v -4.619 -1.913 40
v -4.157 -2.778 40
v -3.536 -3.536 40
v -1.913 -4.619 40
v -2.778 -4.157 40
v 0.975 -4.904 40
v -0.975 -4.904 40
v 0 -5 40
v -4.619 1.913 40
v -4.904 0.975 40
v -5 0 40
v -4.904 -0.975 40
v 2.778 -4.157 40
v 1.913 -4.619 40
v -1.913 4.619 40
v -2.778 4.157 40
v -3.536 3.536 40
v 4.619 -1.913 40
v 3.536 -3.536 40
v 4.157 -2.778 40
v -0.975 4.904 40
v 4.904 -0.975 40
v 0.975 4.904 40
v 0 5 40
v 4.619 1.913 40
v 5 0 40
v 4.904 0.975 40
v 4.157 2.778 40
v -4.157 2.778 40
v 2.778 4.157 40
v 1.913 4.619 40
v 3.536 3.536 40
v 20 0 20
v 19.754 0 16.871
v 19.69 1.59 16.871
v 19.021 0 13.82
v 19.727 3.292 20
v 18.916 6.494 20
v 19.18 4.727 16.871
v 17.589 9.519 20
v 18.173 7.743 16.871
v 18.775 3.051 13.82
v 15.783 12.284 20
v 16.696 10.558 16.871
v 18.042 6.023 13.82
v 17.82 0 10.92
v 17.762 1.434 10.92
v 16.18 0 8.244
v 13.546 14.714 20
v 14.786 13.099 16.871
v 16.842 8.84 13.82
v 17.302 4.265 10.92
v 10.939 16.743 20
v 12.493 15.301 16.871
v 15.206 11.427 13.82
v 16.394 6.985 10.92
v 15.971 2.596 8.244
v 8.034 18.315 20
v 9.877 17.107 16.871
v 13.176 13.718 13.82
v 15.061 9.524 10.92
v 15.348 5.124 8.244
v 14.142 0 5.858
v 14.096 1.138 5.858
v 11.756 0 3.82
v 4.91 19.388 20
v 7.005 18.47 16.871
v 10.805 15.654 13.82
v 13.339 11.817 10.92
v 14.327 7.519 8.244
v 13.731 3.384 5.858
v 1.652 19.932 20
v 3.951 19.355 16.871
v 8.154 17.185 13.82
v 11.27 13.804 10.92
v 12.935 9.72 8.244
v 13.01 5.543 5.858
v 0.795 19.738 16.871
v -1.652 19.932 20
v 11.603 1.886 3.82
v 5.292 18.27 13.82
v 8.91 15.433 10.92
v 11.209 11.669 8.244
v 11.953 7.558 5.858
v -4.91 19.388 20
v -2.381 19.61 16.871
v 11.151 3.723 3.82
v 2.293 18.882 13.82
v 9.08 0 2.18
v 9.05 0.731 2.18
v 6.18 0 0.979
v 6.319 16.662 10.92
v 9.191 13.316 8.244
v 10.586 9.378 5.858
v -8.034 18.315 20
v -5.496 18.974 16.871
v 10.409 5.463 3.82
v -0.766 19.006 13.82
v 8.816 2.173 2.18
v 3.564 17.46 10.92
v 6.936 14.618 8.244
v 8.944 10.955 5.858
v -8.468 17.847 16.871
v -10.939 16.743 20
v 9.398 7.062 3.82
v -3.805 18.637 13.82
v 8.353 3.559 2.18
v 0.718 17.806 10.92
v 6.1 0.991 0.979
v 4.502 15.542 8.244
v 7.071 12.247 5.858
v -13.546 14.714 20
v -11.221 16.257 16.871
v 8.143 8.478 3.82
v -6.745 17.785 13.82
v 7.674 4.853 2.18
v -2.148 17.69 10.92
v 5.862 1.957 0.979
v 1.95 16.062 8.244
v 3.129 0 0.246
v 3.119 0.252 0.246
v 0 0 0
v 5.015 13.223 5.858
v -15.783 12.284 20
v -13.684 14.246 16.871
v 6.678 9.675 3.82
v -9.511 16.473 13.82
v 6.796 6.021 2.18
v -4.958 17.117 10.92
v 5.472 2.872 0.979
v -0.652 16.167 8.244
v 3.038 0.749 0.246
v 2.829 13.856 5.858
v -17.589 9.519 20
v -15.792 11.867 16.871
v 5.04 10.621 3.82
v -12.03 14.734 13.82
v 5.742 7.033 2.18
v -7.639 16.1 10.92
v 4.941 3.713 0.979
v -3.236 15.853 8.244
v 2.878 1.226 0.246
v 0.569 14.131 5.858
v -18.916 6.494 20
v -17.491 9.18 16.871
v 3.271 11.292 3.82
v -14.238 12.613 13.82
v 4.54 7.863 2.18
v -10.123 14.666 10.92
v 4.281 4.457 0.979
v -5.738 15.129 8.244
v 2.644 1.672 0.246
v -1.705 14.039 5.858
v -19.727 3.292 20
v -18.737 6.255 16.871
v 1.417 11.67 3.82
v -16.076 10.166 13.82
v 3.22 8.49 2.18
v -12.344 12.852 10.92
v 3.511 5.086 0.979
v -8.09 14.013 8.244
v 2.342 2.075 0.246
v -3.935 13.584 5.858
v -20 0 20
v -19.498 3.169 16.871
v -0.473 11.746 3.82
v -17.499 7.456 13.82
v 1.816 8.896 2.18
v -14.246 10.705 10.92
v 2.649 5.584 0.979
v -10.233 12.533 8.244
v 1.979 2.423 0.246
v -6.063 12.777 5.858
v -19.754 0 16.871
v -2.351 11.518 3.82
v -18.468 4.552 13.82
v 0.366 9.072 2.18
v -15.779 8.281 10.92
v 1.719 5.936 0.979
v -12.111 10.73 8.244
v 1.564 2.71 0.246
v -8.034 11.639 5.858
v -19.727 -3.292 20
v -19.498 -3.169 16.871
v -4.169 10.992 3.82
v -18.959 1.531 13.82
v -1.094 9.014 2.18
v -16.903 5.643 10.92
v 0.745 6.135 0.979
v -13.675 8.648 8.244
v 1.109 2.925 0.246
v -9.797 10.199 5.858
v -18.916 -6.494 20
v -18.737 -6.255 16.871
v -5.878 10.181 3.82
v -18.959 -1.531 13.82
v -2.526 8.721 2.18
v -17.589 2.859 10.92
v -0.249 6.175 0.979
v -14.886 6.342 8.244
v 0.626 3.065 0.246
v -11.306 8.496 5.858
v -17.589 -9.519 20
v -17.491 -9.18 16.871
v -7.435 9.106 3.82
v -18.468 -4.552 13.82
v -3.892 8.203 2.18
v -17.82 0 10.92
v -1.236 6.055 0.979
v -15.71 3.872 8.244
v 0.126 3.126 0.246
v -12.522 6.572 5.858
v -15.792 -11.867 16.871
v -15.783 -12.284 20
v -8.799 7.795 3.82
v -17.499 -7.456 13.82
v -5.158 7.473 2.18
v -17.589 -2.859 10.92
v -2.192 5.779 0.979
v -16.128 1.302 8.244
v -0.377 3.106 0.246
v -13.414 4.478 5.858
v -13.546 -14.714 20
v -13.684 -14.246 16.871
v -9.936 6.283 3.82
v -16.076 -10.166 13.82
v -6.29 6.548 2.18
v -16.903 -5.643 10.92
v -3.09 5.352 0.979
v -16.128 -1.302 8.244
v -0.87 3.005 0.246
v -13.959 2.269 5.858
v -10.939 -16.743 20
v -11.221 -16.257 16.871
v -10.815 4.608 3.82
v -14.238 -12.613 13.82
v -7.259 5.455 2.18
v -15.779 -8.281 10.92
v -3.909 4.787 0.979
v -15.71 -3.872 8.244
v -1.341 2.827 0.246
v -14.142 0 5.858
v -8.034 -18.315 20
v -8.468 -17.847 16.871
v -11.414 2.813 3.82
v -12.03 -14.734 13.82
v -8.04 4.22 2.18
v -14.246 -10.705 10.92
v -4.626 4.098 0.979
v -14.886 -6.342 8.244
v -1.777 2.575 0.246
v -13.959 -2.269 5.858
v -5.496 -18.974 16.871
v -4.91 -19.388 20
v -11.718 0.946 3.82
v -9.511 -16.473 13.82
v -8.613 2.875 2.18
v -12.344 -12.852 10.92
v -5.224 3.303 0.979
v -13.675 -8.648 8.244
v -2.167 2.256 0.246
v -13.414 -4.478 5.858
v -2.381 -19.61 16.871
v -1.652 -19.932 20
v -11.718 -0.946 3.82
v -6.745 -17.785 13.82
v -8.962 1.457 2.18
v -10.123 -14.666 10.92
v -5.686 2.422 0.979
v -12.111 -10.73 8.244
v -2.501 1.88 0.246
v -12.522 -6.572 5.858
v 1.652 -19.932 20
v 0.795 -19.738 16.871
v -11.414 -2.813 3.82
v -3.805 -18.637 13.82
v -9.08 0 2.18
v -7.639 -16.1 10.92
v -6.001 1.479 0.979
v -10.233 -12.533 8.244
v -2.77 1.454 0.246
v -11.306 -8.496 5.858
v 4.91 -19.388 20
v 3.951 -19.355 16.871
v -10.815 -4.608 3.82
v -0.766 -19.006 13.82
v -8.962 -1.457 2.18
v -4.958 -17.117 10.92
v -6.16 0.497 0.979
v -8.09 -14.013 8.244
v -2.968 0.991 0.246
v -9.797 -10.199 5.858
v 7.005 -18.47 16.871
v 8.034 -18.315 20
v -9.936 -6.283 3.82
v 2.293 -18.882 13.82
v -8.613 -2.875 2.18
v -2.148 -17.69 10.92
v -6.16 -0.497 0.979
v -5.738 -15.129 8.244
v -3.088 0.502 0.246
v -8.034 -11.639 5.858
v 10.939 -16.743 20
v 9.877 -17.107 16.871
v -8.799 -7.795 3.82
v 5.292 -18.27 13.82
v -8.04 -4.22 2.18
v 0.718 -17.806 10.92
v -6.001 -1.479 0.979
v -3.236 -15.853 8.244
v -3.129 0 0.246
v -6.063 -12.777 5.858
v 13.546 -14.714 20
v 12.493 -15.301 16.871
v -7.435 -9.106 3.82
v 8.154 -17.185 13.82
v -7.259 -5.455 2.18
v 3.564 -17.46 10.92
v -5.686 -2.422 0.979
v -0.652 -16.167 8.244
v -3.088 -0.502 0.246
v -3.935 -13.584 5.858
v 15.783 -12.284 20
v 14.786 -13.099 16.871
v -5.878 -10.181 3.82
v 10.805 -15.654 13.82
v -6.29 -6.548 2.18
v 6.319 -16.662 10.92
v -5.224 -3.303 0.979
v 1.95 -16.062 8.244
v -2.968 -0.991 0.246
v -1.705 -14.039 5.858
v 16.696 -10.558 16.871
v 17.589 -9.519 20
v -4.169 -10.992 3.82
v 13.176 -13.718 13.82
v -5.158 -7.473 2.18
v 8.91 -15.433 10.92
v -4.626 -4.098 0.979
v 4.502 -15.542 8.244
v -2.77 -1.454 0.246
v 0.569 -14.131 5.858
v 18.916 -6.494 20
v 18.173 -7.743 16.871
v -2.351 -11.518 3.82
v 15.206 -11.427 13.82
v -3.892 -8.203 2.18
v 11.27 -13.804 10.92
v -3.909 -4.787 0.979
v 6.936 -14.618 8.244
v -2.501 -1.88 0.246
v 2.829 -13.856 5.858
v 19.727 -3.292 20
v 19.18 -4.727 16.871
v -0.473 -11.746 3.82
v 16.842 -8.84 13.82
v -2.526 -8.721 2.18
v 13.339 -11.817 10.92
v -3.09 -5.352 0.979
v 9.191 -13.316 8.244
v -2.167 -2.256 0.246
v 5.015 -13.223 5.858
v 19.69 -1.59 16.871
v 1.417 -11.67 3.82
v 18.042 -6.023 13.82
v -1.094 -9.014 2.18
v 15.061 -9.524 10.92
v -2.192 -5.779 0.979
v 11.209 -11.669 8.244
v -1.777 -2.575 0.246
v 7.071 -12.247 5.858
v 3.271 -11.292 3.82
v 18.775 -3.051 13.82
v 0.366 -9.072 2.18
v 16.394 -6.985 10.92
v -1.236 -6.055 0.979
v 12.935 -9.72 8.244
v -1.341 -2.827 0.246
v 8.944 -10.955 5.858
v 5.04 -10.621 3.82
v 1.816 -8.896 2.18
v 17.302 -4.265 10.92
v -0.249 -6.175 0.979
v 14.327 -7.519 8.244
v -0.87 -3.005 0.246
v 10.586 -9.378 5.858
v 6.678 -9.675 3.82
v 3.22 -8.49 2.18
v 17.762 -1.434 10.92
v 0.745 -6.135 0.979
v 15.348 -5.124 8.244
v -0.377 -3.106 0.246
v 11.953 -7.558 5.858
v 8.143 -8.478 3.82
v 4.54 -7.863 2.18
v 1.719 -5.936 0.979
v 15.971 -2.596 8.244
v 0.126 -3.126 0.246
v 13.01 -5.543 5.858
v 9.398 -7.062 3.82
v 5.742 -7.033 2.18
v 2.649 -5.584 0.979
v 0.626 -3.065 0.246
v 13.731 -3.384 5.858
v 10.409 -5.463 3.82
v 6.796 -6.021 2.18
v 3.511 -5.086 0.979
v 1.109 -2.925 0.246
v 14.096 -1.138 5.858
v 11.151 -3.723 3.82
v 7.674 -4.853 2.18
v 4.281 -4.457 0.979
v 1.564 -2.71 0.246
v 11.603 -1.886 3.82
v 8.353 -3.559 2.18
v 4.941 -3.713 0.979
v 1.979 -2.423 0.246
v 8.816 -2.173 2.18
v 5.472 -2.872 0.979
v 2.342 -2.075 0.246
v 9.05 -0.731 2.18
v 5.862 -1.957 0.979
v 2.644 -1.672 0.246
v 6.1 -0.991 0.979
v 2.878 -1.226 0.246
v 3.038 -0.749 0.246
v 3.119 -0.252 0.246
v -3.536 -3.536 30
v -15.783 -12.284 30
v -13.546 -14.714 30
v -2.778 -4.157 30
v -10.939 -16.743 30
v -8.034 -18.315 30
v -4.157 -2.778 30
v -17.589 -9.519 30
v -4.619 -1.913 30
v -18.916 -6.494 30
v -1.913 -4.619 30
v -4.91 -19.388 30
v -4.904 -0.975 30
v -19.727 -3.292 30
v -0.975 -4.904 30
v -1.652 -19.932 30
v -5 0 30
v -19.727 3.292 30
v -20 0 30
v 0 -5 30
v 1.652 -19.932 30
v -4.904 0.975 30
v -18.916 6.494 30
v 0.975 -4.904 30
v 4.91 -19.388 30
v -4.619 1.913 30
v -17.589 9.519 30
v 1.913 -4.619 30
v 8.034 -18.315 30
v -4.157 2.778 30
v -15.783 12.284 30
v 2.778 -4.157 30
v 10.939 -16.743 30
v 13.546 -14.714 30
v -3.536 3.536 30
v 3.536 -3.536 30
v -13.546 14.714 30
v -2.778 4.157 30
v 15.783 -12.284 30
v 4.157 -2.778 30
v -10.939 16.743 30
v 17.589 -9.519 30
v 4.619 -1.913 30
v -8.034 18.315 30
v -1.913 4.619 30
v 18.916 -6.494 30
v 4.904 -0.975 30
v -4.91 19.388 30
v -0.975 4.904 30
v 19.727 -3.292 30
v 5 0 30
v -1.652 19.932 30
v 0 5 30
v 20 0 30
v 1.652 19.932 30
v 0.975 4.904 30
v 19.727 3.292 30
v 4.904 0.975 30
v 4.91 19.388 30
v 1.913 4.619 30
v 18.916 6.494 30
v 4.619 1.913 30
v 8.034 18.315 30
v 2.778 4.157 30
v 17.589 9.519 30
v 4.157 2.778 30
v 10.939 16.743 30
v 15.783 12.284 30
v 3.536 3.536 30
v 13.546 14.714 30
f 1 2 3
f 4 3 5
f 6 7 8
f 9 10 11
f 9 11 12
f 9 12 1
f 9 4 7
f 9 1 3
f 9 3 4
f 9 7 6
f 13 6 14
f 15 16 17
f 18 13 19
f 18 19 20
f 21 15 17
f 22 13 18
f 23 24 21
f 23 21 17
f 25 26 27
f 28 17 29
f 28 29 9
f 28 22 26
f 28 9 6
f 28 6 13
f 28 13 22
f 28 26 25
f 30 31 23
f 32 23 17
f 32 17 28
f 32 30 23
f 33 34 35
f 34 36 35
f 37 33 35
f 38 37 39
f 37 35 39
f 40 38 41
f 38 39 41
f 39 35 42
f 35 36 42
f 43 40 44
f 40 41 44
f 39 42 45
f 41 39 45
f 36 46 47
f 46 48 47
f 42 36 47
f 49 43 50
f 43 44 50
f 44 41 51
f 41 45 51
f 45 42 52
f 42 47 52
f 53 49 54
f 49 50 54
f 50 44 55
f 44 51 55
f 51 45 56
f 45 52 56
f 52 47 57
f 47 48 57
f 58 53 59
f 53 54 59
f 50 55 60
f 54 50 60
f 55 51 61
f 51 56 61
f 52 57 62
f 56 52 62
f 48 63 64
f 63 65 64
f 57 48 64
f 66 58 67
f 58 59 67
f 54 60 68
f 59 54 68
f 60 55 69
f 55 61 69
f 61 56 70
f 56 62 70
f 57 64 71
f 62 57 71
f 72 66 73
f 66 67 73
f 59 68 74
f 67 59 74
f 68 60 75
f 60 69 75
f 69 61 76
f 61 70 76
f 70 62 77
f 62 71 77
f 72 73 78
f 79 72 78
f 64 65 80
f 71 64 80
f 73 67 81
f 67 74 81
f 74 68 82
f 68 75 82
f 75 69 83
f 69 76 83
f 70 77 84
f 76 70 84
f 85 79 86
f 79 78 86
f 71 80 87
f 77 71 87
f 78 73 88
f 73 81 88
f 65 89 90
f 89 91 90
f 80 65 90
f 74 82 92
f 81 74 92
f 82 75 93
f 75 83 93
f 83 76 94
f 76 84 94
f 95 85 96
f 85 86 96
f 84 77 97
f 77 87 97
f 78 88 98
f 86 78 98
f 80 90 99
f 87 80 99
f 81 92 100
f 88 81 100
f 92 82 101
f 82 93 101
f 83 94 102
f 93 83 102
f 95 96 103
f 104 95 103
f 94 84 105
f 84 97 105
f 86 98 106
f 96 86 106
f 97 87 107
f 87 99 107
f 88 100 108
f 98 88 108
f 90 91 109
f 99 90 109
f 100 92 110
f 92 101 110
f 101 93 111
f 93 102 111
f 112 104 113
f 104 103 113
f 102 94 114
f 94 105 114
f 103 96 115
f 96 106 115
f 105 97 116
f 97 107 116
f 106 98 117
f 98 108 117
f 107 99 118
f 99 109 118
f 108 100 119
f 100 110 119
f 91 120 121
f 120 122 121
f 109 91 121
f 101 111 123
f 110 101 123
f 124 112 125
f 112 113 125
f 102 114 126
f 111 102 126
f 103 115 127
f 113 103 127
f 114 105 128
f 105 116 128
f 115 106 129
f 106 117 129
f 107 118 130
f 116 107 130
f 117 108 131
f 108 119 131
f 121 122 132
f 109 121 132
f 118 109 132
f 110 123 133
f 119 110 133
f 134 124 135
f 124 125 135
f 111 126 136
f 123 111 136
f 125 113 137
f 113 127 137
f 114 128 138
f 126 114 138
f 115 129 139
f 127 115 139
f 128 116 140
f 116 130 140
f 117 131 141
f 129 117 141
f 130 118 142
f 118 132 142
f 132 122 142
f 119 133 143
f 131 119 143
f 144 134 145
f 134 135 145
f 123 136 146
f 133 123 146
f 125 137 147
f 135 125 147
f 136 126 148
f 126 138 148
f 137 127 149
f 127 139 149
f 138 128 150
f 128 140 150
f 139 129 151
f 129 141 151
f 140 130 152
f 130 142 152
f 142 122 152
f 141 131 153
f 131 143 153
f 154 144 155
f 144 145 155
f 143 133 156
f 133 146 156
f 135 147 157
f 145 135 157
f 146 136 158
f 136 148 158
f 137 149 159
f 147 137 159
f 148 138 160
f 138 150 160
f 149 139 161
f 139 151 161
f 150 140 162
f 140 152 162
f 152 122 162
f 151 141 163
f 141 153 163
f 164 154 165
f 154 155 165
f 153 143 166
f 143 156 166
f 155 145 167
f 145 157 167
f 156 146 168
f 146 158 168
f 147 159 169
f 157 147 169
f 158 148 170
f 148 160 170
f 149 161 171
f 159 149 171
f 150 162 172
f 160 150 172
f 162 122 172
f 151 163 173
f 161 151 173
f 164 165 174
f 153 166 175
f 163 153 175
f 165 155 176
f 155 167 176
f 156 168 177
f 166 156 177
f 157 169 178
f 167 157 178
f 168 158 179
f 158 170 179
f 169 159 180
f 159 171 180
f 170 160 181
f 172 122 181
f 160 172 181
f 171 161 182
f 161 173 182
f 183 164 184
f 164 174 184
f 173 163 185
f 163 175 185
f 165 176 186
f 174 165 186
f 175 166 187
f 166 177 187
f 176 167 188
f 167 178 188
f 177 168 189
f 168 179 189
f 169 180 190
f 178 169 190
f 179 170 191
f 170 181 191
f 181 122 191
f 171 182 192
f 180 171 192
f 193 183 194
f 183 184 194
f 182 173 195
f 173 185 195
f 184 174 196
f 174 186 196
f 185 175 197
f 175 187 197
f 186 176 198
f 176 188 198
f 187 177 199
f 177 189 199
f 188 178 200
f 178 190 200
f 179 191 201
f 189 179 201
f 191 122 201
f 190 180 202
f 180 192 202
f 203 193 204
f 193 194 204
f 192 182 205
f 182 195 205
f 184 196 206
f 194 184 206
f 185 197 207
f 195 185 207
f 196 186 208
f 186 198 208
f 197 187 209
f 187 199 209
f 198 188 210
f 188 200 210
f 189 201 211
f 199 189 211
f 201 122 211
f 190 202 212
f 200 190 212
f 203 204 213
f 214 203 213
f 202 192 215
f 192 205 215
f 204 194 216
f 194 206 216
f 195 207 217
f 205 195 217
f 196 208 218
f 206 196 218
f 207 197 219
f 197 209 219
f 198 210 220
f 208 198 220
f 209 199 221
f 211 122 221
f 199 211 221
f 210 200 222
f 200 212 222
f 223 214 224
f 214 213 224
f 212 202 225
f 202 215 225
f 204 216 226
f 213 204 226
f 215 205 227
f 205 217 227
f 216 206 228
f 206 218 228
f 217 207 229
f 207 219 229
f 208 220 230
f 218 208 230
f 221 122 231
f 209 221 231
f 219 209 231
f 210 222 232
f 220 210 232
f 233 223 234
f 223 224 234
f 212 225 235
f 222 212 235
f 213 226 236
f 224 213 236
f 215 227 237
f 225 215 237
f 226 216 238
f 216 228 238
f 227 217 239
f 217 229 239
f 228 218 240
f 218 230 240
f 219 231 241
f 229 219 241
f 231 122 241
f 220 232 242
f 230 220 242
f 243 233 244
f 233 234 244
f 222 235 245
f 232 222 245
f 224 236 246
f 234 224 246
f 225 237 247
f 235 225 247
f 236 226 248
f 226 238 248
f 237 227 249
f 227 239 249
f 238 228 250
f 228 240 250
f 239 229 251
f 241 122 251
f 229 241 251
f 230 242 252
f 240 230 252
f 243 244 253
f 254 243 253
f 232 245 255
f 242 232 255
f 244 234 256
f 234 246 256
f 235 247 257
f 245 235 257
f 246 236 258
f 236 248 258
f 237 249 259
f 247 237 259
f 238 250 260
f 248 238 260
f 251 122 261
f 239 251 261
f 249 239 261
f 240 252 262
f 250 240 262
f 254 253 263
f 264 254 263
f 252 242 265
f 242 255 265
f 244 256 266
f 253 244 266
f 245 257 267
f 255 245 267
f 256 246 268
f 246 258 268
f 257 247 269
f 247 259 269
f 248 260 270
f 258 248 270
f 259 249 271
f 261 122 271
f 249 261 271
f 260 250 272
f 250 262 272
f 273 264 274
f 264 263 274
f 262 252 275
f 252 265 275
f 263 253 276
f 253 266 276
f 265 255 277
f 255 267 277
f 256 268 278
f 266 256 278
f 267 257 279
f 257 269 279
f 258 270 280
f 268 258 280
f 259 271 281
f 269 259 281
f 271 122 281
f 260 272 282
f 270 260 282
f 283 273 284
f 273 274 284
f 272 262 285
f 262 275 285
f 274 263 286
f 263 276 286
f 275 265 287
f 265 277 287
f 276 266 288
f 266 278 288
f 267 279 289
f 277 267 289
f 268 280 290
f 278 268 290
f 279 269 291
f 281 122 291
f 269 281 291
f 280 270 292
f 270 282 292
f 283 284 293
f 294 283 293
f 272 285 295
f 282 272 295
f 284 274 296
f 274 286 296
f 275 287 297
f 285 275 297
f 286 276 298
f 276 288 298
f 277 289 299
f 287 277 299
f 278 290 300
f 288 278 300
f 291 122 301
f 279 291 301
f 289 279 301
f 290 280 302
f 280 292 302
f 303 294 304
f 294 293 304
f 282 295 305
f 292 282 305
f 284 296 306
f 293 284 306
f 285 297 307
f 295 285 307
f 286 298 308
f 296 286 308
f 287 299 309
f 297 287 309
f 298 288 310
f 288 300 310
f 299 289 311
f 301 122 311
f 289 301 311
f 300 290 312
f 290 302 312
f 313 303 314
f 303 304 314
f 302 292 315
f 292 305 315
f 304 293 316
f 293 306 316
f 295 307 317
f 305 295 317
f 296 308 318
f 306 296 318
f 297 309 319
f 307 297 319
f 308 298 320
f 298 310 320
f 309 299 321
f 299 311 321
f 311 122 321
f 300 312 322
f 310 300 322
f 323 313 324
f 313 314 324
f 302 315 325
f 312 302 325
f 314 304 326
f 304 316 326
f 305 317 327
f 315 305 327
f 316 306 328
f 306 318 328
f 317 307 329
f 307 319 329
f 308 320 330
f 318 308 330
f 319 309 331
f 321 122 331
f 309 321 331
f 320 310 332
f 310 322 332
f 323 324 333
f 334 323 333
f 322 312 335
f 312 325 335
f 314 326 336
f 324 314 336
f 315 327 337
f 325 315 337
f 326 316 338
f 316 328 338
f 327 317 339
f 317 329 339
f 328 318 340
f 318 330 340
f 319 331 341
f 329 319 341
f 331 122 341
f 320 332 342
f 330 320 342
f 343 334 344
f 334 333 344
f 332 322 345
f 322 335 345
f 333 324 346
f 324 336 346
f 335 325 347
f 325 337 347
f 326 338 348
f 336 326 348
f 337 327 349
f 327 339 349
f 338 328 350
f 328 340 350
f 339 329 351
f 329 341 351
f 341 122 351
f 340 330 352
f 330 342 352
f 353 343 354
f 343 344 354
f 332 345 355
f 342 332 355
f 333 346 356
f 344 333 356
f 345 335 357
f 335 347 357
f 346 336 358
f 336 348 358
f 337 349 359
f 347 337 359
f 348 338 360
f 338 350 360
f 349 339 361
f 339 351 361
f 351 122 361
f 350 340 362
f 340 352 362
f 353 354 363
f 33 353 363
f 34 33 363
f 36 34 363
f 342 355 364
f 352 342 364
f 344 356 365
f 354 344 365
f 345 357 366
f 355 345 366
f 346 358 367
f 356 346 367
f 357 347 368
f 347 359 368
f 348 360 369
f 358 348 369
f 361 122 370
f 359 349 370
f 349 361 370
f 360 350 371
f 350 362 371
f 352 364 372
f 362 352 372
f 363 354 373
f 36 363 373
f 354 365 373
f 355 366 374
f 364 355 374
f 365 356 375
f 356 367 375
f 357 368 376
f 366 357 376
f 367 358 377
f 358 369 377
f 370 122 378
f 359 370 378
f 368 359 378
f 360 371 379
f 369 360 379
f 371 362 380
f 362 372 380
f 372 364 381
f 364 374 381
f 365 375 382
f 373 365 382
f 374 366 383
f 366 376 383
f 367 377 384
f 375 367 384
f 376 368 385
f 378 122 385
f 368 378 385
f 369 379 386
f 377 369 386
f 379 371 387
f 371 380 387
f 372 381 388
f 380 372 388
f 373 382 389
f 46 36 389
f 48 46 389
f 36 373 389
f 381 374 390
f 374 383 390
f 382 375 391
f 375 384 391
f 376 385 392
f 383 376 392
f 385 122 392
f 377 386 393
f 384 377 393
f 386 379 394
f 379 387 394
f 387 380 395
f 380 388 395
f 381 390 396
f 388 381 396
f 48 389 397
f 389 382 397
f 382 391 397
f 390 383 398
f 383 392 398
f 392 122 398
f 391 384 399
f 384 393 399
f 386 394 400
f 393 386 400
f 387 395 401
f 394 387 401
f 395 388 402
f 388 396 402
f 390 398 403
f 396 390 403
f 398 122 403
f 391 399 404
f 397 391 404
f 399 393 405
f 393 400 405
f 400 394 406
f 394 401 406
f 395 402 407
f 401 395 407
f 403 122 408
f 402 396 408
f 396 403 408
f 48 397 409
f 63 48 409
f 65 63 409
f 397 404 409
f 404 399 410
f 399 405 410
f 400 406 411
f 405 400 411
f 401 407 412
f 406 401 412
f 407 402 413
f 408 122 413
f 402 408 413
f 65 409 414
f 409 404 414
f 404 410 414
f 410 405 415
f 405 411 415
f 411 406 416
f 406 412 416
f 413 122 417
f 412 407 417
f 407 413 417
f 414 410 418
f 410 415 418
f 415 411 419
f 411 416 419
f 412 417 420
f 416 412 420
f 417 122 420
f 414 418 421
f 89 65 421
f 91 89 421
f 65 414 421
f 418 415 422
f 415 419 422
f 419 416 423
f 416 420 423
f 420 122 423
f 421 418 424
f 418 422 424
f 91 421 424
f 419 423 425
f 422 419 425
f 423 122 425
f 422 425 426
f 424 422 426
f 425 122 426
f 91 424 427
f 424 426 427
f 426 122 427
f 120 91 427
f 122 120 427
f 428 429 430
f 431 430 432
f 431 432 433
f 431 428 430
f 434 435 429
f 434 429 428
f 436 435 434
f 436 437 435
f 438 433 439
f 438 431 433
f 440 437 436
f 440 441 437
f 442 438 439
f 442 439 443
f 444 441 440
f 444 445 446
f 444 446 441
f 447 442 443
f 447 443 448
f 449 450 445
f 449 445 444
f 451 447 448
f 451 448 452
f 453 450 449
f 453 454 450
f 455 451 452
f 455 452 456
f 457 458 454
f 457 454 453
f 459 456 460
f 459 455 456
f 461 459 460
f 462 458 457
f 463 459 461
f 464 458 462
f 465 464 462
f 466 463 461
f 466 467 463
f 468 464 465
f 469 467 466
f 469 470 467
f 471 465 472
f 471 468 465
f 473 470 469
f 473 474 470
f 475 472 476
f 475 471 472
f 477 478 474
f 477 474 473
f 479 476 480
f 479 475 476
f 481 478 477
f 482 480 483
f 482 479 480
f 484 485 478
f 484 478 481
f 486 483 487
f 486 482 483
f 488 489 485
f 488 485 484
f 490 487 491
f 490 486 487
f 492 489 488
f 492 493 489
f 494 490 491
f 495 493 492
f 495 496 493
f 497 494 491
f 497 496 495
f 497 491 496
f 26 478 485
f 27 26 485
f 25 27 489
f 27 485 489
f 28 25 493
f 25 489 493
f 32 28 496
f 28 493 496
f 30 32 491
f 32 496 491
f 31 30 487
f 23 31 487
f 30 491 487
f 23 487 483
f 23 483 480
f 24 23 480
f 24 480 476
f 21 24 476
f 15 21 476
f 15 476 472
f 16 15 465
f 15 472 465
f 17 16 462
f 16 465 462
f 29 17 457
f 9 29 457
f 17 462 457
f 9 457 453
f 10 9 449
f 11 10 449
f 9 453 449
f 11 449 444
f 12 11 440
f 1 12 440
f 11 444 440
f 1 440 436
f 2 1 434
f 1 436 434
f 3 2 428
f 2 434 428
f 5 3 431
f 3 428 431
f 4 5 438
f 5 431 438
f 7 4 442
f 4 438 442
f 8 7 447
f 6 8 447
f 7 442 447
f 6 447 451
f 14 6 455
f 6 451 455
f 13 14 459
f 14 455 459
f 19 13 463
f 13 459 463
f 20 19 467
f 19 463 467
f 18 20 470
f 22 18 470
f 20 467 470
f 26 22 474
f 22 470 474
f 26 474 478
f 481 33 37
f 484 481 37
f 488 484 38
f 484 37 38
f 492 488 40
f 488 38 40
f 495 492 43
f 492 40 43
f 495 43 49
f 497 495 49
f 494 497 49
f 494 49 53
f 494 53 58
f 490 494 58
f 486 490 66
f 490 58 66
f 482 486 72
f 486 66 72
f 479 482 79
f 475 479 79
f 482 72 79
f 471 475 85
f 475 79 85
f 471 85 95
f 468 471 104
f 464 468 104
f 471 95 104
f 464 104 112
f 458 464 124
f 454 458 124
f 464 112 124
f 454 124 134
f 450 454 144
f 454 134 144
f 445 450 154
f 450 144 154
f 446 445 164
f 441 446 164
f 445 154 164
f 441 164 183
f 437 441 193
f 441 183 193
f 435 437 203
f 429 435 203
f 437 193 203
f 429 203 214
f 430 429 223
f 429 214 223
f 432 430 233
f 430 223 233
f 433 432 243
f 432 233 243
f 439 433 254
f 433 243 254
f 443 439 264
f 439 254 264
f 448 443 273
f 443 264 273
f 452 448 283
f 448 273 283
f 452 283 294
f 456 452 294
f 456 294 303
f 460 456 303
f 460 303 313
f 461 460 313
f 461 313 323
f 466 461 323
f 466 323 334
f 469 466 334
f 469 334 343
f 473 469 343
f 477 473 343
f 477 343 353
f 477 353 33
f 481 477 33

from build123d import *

# Parameters (mm, degrees)
SKETCH1_R           = 20
BOSS_EXTRUDE1_DEPTH = 30
SKETCH2_R           = 5
BOSS_EXTRUDE2_DEPTH = 10
FILLET1_R           = 20


with BuildPart() as part:
    # Sketch1 → Boss-Extrude1 (new body)
    with BuildSketch(Plane.XY):
        Circle(SKETCH1_R)
    extrude(amount=BOSS_EXTRUDE1_DEPTH)

    # Sketch2 → Boss-Extrude2 (add)
    with BuildSketch(Plane.XY.offset(30)):
        Circle(SKETCH2_R)
    extrude(amount=BOSS_EXTRUDE2_DEPTH)

    # Fillet1
    fillet1_edges = [part.edges().sort_by_distance(p)[0] for p in [
        (-20, 0, 0),
    ]]
    fillet(fillet1_edges, radius=FILLET1_R)


solid = part.part
